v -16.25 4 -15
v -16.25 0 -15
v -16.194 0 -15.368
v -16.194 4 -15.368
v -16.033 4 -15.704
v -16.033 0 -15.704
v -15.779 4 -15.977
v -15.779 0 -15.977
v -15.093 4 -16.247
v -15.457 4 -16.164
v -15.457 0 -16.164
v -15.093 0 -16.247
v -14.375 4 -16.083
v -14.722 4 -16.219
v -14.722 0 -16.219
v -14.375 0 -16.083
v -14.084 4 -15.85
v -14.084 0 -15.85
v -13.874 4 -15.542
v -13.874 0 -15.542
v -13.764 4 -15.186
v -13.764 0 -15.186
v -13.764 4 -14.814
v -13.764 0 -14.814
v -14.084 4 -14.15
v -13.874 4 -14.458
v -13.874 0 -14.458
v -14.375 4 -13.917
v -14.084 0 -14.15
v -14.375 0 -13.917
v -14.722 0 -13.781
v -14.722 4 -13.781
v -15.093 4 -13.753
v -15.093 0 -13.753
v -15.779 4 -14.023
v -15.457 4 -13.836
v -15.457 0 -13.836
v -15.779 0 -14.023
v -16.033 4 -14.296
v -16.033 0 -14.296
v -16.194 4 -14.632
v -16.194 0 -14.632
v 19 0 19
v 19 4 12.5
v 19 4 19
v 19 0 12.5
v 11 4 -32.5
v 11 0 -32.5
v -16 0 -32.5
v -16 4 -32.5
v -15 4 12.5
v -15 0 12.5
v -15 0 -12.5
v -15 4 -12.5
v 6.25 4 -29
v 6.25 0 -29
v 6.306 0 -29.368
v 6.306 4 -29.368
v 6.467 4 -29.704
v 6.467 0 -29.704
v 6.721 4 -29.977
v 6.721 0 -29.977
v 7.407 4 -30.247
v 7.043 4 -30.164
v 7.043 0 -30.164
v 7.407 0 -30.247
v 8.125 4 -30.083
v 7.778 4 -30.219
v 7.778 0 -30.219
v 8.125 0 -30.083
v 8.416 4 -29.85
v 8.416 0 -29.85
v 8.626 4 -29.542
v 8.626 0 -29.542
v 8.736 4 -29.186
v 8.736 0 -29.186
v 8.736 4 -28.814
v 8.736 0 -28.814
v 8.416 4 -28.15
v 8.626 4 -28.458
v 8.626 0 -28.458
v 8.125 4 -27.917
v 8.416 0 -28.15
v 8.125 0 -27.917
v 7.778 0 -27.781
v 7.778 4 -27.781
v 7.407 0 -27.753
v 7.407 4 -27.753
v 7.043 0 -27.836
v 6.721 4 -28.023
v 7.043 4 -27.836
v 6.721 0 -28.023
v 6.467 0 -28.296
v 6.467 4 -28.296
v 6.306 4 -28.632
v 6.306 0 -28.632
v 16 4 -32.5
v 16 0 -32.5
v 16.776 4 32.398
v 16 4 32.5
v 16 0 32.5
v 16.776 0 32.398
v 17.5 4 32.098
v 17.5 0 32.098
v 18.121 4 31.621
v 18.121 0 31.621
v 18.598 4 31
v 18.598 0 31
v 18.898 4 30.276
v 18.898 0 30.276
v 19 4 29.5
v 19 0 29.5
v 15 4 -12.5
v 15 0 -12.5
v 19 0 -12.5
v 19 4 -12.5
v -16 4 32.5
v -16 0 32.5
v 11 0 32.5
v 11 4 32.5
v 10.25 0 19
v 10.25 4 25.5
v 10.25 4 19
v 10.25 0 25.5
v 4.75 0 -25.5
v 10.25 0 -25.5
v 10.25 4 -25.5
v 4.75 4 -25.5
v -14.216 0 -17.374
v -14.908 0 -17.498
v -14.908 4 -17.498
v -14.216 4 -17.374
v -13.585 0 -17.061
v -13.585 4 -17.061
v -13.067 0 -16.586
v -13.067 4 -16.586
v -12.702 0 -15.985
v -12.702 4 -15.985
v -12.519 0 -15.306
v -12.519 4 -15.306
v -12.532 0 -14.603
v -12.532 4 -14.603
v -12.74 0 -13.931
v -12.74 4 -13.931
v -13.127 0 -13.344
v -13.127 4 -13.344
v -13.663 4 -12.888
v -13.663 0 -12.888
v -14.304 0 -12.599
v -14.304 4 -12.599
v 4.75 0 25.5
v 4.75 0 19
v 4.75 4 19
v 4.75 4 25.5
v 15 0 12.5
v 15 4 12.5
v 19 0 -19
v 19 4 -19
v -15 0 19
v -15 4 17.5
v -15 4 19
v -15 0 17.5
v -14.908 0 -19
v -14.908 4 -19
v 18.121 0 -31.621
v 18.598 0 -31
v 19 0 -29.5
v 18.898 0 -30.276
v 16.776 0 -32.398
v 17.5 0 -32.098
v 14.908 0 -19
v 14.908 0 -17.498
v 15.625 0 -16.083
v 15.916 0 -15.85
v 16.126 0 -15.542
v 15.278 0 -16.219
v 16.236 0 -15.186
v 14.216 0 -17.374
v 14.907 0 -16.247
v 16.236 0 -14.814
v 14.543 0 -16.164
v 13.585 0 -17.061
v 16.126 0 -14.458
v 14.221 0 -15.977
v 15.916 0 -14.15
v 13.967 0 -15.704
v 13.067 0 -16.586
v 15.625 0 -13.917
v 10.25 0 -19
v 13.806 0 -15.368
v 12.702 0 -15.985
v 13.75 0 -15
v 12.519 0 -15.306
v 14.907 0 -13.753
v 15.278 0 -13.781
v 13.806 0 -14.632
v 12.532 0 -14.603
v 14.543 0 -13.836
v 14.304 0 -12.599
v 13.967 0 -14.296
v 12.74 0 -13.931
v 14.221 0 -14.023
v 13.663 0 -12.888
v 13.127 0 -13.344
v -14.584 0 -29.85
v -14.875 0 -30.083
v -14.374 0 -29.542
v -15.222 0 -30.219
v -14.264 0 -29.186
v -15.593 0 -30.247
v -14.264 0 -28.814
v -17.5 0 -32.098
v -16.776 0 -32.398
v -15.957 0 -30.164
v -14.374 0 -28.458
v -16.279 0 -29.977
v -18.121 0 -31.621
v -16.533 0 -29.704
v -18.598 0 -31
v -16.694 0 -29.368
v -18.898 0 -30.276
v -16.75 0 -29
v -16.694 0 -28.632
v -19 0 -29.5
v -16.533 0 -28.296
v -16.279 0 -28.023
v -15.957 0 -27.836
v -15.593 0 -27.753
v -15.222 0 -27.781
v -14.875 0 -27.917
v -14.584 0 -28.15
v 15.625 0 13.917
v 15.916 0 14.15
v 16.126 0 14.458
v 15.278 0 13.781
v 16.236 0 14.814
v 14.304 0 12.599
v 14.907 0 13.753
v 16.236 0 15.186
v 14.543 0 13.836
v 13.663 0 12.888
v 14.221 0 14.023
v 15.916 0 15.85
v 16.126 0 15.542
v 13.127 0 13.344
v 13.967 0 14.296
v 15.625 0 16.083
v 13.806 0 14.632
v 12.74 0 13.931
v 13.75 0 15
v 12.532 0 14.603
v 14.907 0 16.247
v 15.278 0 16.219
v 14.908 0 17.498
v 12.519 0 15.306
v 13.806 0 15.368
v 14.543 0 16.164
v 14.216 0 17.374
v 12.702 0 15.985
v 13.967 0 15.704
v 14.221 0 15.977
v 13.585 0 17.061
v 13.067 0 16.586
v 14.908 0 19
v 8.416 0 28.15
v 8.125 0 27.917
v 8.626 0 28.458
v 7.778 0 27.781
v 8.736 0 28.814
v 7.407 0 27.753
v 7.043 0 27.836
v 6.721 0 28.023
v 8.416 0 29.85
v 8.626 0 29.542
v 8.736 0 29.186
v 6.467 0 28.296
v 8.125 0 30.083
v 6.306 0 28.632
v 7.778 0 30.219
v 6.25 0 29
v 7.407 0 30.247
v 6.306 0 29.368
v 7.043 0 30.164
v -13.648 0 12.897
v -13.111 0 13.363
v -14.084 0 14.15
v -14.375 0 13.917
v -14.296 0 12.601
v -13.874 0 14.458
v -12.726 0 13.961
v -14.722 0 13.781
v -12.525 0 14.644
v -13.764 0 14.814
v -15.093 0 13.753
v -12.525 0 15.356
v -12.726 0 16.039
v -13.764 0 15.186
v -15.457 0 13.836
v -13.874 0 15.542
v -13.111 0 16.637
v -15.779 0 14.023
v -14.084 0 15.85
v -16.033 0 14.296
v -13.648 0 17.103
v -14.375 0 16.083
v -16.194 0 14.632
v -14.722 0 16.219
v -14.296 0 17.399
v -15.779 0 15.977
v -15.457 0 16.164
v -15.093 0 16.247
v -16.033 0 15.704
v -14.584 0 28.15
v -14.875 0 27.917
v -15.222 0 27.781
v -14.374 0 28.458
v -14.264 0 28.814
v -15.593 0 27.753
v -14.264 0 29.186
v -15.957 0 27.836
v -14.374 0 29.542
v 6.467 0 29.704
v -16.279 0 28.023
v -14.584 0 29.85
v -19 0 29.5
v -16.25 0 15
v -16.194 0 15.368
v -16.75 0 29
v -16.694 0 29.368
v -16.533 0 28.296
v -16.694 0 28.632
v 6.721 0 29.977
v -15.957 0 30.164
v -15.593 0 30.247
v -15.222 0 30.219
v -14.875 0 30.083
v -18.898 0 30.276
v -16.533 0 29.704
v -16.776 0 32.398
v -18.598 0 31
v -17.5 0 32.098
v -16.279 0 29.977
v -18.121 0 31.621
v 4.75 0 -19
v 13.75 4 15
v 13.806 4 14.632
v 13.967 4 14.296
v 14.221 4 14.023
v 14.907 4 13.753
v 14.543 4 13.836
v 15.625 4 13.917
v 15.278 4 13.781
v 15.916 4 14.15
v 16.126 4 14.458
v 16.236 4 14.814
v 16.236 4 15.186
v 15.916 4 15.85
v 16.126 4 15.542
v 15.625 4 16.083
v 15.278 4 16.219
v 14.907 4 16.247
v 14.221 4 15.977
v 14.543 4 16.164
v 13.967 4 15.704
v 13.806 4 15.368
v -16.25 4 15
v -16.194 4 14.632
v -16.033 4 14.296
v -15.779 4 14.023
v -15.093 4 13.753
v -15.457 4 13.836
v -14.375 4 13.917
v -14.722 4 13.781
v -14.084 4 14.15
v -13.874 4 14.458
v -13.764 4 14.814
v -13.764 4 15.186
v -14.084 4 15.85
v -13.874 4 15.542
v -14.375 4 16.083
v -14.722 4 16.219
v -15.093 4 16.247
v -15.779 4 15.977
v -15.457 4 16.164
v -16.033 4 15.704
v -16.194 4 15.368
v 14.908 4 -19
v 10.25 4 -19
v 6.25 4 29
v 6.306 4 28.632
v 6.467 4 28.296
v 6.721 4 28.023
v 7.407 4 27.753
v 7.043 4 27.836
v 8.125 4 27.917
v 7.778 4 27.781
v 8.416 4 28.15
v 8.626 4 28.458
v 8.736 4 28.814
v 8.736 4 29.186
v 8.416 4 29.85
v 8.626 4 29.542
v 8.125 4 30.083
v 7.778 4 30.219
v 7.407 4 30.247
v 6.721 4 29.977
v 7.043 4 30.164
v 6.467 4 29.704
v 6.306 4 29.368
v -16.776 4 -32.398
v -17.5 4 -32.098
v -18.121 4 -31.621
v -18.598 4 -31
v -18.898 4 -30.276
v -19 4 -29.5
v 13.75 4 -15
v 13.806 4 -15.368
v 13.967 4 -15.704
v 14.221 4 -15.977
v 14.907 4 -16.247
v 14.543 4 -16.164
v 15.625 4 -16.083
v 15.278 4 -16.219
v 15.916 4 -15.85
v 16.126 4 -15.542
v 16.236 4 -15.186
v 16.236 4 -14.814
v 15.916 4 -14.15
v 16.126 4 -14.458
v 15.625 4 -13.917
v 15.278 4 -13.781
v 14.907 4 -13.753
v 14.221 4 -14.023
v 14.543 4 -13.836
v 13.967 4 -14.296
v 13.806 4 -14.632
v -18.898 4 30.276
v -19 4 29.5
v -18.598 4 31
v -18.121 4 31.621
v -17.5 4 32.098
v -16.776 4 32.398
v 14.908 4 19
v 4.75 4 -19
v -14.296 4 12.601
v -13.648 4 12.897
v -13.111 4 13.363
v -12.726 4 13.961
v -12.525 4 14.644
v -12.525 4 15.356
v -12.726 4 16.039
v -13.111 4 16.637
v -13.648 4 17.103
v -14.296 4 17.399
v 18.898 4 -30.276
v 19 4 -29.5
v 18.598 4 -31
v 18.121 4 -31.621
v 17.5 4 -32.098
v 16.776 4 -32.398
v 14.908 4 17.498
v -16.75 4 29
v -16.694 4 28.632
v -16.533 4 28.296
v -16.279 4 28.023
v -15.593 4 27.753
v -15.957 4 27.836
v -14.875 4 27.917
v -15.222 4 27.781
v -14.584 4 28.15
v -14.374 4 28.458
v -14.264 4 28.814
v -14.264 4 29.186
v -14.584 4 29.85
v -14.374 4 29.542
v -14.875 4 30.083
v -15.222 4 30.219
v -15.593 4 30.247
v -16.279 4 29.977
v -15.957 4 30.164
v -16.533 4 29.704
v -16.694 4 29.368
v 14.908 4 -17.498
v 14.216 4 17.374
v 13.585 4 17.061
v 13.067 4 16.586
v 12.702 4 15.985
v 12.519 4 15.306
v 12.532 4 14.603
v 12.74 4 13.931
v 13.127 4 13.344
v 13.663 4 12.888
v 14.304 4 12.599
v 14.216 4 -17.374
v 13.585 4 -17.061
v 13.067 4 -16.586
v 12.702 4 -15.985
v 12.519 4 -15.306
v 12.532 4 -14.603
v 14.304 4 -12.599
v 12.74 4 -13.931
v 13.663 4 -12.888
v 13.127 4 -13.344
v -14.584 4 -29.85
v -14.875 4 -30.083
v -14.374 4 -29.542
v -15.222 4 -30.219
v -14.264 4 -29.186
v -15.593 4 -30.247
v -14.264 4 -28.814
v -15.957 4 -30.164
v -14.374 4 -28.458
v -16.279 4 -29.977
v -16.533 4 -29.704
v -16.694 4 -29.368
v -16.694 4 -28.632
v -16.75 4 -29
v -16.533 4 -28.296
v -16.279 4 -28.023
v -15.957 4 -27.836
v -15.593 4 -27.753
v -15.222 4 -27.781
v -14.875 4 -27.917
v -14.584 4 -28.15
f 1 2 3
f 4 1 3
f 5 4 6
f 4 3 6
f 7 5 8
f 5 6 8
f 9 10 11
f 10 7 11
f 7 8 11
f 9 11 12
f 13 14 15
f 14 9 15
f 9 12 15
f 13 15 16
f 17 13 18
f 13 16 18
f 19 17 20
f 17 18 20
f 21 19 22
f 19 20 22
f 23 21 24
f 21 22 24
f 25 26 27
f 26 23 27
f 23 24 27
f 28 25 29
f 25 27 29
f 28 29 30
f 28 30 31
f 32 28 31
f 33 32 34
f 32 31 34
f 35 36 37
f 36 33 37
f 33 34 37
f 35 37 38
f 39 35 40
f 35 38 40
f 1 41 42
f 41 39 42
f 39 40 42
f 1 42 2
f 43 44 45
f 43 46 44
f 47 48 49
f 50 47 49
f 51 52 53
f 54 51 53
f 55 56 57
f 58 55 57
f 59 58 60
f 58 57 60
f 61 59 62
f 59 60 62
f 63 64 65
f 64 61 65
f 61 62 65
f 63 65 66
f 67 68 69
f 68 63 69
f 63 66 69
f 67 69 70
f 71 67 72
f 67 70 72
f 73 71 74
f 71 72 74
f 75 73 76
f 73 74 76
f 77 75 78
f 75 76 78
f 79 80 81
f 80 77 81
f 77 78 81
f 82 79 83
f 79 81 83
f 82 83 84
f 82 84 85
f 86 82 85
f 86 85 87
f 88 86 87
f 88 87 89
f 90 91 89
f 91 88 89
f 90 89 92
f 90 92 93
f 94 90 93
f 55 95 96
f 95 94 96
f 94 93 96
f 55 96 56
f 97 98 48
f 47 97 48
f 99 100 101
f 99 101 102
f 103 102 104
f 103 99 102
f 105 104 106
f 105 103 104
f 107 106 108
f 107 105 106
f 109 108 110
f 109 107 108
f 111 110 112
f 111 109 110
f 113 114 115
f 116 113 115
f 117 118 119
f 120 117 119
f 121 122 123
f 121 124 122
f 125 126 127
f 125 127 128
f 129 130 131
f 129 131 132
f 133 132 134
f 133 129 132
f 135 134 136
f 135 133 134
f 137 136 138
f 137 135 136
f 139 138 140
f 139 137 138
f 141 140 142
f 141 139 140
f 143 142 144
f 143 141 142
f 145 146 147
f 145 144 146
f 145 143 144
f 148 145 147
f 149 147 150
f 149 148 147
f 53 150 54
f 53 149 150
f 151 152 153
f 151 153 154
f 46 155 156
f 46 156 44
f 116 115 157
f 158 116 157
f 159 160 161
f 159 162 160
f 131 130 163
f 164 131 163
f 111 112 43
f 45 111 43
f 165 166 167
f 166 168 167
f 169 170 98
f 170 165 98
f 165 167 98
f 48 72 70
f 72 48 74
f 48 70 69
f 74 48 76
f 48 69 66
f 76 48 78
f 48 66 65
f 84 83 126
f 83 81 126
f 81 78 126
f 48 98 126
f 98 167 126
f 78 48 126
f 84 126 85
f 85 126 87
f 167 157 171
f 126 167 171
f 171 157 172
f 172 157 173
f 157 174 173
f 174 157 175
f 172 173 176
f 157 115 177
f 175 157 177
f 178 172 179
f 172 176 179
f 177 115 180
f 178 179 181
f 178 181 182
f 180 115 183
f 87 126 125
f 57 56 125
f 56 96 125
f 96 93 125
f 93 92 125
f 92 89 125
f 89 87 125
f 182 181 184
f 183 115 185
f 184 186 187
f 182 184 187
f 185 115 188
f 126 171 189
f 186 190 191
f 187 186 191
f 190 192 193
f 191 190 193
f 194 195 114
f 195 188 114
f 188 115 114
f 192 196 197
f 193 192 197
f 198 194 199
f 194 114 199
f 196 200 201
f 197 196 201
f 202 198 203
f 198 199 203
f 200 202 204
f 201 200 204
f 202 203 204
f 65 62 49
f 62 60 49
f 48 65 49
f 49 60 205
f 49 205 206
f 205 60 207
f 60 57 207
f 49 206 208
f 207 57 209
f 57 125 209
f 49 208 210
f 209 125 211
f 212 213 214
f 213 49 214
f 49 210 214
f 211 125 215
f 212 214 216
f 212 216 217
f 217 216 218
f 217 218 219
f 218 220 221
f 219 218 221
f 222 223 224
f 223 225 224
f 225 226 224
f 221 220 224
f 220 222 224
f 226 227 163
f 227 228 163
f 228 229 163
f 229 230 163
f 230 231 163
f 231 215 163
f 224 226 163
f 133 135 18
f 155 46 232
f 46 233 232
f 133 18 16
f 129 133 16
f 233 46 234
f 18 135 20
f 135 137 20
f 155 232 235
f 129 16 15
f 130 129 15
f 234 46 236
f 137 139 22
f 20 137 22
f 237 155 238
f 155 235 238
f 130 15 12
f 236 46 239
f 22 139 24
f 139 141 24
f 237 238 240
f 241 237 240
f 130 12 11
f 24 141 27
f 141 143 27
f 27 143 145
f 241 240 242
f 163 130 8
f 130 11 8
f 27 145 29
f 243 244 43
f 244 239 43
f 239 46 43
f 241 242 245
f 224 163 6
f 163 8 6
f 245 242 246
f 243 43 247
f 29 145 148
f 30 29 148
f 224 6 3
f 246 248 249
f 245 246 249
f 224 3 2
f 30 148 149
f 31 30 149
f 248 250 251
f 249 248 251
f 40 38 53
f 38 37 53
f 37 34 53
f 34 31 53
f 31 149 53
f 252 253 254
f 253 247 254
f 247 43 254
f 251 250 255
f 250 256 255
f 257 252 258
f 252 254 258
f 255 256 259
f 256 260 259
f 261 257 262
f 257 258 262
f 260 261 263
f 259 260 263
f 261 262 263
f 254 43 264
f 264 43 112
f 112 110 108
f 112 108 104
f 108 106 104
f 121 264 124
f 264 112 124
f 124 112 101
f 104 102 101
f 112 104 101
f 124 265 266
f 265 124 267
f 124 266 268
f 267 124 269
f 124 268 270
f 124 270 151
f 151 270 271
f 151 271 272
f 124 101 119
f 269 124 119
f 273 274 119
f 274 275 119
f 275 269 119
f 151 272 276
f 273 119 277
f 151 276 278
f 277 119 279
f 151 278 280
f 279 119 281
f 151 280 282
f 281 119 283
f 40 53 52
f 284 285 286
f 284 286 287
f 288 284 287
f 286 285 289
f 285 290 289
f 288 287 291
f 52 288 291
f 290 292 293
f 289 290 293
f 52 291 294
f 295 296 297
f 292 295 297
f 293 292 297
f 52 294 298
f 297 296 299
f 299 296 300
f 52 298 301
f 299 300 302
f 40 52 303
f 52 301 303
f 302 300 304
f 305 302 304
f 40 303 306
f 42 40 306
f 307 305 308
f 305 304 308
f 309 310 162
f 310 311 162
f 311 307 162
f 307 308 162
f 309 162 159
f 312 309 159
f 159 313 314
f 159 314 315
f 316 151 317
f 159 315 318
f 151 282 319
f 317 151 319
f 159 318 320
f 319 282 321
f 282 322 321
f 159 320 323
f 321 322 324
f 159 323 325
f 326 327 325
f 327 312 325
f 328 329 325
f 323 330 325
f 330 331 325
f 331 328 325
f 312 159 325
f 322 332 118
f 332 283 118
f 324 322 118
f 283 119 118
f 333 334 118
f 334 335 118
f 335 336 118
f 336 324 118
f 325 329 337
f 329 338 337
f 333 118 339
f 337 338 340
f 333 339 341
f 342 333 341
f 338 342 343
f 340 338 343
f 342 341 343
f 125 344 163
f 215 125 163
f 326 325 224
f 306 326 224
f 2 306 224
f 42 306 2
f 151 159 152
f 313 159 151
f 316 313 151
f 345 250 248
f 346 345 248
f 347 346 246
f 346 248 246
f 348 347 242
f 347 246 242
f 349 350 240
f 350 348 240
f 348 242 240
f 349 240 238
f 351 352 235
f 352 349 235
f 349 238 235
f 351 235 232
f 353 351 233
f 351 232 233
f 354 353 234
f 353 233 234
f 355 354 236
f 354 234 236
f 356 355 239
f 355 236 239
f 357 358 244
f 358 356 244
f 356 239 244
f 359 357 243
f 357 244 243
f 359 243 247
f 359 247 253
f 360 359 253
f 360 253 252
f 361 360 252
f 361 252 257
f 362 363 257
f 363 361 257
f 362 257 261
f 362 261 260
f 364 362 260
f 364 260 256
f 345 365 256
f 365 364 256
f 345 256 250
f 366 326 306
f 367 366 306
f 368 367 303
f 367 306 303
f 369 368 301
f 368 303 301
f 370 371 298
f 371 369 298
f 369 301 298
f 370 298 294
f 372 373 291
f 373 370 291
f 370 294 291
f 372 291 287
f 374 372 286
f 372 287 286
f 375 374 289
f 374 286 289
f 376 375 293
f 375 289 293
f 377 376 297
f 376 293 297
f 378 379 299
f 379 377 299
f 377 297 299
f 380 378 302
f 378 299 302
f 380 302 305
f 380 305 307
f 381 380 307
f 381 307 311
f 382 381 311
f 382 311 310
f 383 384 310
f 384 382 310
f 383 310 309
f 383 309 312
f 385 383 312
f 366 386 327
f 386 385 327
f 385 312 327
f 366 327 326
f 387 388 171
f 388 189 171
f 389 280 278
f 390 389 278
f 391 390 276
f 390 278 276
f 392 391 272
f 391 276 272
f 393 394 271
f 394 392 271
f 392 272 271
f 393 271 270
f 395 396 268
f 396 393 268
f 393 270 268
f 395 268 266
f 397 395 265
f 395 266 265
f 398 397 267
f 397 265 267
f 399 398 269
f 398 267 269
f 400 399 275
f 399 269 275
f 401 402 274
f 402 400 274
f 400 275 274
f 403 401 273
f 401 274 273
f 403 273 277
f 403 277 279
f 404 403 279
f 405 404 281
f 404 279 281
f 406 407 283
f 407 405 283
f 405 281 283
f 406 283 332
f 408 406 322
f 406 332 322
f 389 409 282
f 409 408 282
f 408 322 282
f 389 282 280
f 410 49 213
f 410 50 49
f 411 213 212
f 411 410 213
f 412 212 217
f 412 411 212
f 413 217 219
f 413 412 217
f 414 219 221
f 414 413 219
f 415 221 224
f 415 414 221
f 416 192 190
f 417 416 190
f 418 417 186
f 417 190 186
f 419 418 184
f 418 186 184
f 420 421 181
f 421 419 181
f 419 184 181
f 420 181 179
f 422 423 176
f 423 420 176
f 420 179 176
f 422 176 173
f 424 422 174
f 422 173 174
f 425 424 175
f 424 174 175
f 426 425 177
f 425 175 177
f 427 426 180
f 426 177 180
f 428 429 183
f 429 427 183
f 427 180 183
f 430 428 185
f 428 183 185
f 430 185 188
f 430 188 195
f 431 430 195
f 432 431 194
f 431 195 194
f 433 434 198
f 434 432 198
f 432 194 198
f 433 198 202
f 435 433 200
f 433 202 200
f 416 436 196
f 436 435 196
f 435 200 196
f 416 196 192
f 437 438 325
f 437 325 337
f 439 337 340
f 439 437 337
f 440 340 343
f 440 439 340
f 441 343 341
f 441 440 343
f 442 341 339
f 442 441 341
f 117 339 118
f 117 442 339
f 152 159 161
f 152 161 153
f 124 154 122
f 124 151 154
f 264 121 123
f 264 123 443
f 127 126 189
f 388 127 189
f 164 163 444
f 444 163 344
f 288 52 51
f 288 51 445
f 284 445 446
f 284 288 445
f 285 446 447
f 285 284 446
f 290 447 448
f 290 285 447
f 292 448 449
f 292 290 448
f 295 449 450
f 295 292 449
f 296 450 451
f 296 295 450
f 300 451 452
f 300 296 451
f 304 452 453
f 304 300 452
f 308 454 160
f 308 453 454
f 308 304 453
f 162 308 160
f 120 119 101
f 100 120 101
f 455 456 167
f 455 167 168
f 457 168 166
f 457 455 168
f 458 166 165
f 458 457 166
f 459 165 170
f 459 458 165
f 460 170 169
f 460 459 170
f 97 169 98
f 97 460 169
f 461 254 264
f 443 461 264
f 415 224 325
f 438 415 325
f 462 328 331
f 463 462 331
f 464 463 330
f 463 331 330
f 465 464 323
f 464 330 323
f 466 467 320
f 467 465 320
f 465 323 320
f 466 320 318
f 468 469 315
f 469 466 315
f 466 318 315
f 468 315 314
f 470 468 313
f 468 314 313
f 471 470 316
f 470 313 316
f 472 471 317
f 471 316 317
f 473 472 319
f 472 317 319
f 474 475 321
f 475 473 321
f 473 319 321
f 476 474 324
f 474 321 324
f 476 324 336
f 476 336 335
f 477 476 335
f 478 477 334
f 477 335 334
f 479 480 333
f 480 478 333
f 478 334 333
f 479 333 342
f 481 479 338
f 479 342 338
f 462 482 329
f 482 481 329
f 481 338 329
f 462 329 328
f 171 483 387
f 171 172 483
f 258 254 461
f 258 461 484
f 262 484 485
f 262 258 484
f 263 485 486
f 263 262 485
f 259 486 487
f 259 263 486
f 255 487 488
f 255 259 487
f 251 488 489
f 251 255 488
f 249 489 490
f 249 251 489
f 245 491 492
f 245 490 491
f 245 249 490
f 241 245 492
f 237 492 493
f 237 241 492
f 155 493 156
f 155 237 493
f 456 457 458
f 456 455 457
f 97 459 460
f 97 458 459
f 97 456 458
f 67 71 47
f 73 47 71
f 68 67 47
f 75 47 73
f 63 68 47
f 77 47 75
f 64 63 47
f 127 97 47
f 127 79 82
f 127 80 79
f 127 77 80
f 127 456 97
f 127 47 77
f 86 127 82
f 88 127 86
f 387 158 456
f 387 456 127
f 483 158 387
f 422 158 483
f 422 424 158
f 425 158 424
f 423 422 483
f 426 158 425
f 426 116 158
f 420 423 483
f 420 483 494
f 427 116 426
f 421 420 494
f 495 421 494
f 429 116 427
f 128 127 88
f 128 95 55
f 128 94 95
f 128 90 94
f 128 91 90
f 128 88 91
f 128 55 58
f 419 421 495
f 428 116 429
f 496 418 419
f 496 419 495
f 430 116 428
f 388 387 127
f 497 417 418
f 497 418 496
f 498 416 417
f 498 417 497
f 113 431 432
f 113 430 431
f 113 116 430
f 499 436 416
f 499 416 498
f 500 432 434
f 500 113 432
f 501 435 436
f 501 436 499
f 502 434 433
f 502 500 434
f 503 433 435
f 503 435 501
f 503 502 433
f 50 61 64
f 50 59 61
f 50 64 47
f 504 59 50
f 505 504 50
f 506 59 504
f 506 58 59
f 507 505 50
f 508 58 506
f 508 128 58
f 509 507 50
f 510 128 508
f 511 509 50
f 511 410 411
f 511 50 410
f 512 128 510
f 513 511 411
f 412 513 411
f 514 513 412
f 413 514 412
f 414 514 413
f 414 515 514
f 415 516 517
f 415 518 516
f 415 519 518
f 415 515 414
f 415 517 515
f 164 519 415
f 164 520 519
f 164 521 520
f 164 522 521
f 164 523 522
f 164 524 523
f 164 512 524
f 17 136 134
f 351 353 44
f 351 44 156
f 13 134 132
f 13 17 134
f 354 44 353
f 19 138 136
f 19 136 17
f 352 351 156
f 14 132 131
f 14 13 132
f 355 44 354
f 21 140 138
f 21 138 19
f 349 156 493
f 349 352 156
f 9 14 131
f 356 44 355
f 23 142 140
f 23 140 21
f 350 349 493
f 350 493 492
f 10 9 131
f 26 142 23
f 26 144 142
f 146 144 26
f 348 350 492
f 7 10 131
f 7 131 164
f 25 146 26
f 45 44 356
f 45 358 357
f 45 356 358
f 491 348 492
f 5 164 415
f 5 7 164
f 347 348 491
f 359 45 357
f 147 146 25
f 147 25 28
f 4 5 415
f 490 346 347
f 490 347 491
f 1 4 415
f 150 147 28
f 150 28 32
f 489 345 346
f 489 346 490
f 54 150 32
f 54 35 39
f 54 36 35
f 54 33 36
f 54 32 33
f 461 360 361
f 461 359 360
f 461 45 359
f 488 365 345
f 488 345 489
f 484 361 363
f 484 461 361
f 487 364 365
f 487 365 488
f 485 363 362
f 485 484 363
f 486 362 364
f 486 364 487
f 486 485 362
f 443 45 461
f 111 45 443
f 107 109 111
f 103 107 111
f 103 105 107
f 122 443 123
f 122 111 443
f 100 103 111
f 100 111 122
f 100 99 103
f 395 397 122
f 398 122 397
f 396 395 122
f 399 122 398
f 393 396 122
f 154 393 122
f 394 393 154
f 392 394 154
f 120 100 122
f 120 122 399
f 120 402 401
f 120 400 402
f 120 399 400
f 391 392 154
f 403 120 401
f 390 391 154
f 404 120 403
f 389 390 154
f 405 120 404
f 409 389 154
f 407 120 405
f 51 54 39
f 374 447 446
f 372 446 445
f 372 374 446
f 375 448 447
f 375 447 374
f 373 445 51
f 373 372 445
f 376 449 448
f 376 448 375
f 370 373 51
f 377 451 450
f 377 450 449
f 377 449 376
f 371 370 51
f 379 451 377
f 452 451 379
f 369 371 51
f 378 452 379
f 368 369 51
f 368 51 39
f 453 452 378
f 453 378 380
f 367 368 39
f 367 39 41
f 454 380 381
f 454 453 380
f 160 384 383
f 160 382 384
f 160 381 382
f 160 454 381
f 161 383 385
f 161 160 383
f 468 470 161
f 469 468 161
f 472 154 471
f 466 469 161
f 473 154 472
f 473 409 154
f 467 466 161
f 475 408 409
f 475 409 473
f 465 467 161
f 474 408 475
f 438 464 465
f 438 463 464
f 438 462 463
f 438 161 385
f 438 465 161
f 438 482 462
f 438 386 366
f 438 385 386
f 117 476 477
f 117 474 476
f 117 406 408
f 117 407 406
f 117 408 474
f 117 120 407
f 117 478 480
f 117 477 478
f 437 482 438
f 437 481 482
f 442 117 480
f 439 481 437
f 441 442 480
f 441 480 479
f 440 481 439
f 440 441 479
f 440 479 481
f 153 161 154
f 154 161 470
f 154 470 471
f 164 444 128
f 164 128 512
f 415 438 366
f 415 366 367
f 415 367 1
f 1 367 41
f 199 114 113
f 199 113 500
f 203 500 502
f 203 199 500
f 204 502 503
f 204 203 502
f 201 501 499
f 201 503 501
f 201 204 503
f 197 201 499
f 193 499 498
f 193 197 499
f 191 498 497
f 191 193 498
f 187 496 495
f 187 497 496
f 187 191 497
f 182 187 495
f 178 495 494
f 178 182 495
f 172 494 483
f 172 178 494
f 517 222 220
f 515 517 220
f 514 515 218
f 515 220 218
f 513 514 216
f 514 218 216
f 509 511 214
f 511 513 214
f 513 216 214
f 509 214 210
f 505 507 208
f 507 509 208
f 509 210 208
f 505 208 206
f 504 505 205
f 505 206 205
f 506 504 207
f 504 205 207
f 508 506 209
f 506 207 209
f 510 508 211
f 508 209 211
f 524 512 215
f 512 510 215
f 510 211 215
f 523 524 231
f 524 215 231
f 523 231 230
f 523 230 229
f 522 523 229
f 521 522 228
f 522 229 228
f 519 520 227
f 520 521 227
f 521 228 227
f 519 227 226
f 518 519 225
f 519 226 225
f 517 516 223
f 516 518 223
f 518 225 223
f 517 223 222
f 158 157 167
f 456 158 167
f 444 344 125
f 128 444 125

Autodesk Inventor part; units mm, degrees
ref_plane "YZ Plane" through (0, 0, 0) normal (1, 0, 0) x (0, 1, 0)
ref_plane "XZ Plane" through (0, 0, 0) normal (0, 1, 0) x (-1, 0, 0)
ref_plane "XY Plane" through (0, 0, 0) normal (0, 0, 1) x (1, 0, 0)
sketch "Sketch1" plane through (0, 0, 0) normal (0, 1, 0) x (-1, 0, 0)
  line L0 (19, 32.5) -> (-11, 32.5)
  line L1 (-11, -32.5) -> (19, -32.5)
  line L2 (19, -32.5) -> (19, 32.5)
  line L3 (19, 32.5) -> (-19, -32.5) construction
  line L4 (-19, 32.5) -> (19, -32.5) construction
  line L5 (19, 19) -> (-19, 19) construction
  line L6 (-19, 19) -> (-19, -19) construction
  line L7 (-19, -19) -> (19, -19) construction
  line L8 (19, -19) -> (19, 19) construction
  line L9 (19, 19) -> (-19, -19) construction
  line L10 (-19, 19) -> (19, -19) construction
  line L11 (19, 32.5) -> (-11, 32.5) construction
  line L12 (-11, 32.5) -> (-11, -32.5) construction
  line L13 (-11, -32.5) -> (19, -32.5) construction
  line L14 (19, -32.5) -> (19, 32.5) construction
  line L15 (-21.9768, -11.3147) -> (-19, 12.5) construction
  line L16 (15.5, 29) -> (-7.5, 29) construction
  line L17 (-7.5, 29) -> (-7.5, -29) construction
  line L18 (-7.5, -29) -> (15.5, -29) construction
  line L19 (15.5, -29) -> (15.5, 29) construction
  line L20 (15, 15) -> (-15, 15) construction
  line L21 (-15, 15) -> (-15, -15) construction
  line L22 (-15, -15) -> (15, -15) construction
  line L23 (15, -15) -> (15, 15) construction
  line L24 (15, 15) -> (-15, -15) construction
  line L25 (-15, 15) -> (15, -15) construction
  circle A0 centre (15, 15) radius 1.25
  circle A1 centre (15, -15) radius 1.25
  circle A2 centre (-15, -15) radius 1.25
  circle A3 centre (-15, 15) radius 1.25
  circle A4 centre (-7.5, 29) radius 1.25
  circle A5 centre (15.5, 29) radius 1.25
  circle A6 centre (15.5, -29) radius 1.25
  circle A7 centre (-7.5, -29) radius 1.25
  circle A8 centre (0, 12) radius 2.5 construction
  circle A9 centre (0, -12) radius 2.5 construction
  line L26 (-4.75, 25.5) -> (-10.25, 25.5)
  line L27 (-10.25, 25.5) -> (-10.25, -25.5) construction
  line L28 (-10.25, -25.5) -> (-4.75, -25.5)
  line L29 (-4.75, -25.5) -> (-4.75, 25.5) construction
  line L30 (-4.75, 25.5) -> (-10.25, -25.5) construction
  line L31 (-10.25, 25.5) -> (-4.75, -25.5) construction
  line L32 (-11, 32.5) -> (-19, 32.5)
  line L33 (-19, 32.5) -> (-19, 19)
  line L34 (-19, -19) -> (-19, -32.5)
  line L35 (-19, -32.5) -> (-11, -32.5)
  arc A10 (-14.9077, -17.4983) -> (-15, -12.5) centre (-15, -15) ccw
  arc A11 (-15, 12.5) -> (-14.9077, 17.4983) centre (-15, 15) ccw
  line L36 (-15, 12.5) -> (-19, 12.5)
  line L37 (-19, 12.5) -> (-19, 19)
  line L38 (-15, -12.5) -> (-19, -12.5)
  line L39 (-19, -12.5) -> (-19, -19)
  line L40 (-14.9077, -17.4983) -> (-14.9077, -19)
  line L41 (-14.9077, 17.4983) -> (-14.9077, 19)
  arc A12 (15, 17.5) -> (15, 12.5) centre (15, 15) ccw
  line L42 (15, 12.5) -> (15, -12.5)
  line L43 (15, 17.5) -> (15, 19)
  line L44 (15, 19) -> (-4.75, 19)
  line L45 (-4.75, 19) -> (-4.75, 25.5)
  line L46 (-10.25, 25.5) -> (-10.25, 19)
  line L47 (-10.25, 19) -> (-14.9077, 19)
  line L48 (14.9077, -17.4983) -> (14.9077, -19)
  line L49 (14.9077, -19) -> (-4.75, -19)
  line L50 (-4.75, -19) -> (-4.75, -25.5)
  line L51 (-10.25, -25.5) -> (-10.25, -19)
  line L52 (-10.25, -19) -> (-14.9077, -19)
  arc A13 (15, -12.5) -> (14.9077, -17.4983) centre (15, -15) ccw
  point P0 (0, 0)
  point P1 (-7.5, 0)
  dimension "d0" = 38
  dimension "d2" = 38
  dimension "d3" = 38
  dimension "d4" = 30
  dimension "d8" = 65
  dimension "d9" = 23
  dimension "d10" = 58
  dimension "d11" = 3.5
  dimension "d13" = 3.5
  dimension "d14" = 2.5
  dimension "d15" = 2.5
  dimension "d16" = 2.5
  dimension "d17" = 2.5
  dimension "d18" = 2.5
  dimension "d19" = 2.5
  dimension "d20" = 2.5
  dimension "d21" = 2.5
  dimension "d22" = 5
  dimension "d23" = 5
  dimension "d24" = 7
  dimension "d25" = 7
  dimension "d31" = 5
  dimension "d32" = 5
  dimension "d33" = 4
  dimension "d34" = 5
  dimension "d36" = 5.5
  dimension "d37" = 51
extrude "Extrusion1" add sketch "Sketch1" along normal blind 4
fillet "Fillet1" radius 3 4 edges at (-19, 2, 32.5) (19, 2, 32.5) (19, 2, -32.5) (-19, 2, -32.5)
properties part number "coupler"
